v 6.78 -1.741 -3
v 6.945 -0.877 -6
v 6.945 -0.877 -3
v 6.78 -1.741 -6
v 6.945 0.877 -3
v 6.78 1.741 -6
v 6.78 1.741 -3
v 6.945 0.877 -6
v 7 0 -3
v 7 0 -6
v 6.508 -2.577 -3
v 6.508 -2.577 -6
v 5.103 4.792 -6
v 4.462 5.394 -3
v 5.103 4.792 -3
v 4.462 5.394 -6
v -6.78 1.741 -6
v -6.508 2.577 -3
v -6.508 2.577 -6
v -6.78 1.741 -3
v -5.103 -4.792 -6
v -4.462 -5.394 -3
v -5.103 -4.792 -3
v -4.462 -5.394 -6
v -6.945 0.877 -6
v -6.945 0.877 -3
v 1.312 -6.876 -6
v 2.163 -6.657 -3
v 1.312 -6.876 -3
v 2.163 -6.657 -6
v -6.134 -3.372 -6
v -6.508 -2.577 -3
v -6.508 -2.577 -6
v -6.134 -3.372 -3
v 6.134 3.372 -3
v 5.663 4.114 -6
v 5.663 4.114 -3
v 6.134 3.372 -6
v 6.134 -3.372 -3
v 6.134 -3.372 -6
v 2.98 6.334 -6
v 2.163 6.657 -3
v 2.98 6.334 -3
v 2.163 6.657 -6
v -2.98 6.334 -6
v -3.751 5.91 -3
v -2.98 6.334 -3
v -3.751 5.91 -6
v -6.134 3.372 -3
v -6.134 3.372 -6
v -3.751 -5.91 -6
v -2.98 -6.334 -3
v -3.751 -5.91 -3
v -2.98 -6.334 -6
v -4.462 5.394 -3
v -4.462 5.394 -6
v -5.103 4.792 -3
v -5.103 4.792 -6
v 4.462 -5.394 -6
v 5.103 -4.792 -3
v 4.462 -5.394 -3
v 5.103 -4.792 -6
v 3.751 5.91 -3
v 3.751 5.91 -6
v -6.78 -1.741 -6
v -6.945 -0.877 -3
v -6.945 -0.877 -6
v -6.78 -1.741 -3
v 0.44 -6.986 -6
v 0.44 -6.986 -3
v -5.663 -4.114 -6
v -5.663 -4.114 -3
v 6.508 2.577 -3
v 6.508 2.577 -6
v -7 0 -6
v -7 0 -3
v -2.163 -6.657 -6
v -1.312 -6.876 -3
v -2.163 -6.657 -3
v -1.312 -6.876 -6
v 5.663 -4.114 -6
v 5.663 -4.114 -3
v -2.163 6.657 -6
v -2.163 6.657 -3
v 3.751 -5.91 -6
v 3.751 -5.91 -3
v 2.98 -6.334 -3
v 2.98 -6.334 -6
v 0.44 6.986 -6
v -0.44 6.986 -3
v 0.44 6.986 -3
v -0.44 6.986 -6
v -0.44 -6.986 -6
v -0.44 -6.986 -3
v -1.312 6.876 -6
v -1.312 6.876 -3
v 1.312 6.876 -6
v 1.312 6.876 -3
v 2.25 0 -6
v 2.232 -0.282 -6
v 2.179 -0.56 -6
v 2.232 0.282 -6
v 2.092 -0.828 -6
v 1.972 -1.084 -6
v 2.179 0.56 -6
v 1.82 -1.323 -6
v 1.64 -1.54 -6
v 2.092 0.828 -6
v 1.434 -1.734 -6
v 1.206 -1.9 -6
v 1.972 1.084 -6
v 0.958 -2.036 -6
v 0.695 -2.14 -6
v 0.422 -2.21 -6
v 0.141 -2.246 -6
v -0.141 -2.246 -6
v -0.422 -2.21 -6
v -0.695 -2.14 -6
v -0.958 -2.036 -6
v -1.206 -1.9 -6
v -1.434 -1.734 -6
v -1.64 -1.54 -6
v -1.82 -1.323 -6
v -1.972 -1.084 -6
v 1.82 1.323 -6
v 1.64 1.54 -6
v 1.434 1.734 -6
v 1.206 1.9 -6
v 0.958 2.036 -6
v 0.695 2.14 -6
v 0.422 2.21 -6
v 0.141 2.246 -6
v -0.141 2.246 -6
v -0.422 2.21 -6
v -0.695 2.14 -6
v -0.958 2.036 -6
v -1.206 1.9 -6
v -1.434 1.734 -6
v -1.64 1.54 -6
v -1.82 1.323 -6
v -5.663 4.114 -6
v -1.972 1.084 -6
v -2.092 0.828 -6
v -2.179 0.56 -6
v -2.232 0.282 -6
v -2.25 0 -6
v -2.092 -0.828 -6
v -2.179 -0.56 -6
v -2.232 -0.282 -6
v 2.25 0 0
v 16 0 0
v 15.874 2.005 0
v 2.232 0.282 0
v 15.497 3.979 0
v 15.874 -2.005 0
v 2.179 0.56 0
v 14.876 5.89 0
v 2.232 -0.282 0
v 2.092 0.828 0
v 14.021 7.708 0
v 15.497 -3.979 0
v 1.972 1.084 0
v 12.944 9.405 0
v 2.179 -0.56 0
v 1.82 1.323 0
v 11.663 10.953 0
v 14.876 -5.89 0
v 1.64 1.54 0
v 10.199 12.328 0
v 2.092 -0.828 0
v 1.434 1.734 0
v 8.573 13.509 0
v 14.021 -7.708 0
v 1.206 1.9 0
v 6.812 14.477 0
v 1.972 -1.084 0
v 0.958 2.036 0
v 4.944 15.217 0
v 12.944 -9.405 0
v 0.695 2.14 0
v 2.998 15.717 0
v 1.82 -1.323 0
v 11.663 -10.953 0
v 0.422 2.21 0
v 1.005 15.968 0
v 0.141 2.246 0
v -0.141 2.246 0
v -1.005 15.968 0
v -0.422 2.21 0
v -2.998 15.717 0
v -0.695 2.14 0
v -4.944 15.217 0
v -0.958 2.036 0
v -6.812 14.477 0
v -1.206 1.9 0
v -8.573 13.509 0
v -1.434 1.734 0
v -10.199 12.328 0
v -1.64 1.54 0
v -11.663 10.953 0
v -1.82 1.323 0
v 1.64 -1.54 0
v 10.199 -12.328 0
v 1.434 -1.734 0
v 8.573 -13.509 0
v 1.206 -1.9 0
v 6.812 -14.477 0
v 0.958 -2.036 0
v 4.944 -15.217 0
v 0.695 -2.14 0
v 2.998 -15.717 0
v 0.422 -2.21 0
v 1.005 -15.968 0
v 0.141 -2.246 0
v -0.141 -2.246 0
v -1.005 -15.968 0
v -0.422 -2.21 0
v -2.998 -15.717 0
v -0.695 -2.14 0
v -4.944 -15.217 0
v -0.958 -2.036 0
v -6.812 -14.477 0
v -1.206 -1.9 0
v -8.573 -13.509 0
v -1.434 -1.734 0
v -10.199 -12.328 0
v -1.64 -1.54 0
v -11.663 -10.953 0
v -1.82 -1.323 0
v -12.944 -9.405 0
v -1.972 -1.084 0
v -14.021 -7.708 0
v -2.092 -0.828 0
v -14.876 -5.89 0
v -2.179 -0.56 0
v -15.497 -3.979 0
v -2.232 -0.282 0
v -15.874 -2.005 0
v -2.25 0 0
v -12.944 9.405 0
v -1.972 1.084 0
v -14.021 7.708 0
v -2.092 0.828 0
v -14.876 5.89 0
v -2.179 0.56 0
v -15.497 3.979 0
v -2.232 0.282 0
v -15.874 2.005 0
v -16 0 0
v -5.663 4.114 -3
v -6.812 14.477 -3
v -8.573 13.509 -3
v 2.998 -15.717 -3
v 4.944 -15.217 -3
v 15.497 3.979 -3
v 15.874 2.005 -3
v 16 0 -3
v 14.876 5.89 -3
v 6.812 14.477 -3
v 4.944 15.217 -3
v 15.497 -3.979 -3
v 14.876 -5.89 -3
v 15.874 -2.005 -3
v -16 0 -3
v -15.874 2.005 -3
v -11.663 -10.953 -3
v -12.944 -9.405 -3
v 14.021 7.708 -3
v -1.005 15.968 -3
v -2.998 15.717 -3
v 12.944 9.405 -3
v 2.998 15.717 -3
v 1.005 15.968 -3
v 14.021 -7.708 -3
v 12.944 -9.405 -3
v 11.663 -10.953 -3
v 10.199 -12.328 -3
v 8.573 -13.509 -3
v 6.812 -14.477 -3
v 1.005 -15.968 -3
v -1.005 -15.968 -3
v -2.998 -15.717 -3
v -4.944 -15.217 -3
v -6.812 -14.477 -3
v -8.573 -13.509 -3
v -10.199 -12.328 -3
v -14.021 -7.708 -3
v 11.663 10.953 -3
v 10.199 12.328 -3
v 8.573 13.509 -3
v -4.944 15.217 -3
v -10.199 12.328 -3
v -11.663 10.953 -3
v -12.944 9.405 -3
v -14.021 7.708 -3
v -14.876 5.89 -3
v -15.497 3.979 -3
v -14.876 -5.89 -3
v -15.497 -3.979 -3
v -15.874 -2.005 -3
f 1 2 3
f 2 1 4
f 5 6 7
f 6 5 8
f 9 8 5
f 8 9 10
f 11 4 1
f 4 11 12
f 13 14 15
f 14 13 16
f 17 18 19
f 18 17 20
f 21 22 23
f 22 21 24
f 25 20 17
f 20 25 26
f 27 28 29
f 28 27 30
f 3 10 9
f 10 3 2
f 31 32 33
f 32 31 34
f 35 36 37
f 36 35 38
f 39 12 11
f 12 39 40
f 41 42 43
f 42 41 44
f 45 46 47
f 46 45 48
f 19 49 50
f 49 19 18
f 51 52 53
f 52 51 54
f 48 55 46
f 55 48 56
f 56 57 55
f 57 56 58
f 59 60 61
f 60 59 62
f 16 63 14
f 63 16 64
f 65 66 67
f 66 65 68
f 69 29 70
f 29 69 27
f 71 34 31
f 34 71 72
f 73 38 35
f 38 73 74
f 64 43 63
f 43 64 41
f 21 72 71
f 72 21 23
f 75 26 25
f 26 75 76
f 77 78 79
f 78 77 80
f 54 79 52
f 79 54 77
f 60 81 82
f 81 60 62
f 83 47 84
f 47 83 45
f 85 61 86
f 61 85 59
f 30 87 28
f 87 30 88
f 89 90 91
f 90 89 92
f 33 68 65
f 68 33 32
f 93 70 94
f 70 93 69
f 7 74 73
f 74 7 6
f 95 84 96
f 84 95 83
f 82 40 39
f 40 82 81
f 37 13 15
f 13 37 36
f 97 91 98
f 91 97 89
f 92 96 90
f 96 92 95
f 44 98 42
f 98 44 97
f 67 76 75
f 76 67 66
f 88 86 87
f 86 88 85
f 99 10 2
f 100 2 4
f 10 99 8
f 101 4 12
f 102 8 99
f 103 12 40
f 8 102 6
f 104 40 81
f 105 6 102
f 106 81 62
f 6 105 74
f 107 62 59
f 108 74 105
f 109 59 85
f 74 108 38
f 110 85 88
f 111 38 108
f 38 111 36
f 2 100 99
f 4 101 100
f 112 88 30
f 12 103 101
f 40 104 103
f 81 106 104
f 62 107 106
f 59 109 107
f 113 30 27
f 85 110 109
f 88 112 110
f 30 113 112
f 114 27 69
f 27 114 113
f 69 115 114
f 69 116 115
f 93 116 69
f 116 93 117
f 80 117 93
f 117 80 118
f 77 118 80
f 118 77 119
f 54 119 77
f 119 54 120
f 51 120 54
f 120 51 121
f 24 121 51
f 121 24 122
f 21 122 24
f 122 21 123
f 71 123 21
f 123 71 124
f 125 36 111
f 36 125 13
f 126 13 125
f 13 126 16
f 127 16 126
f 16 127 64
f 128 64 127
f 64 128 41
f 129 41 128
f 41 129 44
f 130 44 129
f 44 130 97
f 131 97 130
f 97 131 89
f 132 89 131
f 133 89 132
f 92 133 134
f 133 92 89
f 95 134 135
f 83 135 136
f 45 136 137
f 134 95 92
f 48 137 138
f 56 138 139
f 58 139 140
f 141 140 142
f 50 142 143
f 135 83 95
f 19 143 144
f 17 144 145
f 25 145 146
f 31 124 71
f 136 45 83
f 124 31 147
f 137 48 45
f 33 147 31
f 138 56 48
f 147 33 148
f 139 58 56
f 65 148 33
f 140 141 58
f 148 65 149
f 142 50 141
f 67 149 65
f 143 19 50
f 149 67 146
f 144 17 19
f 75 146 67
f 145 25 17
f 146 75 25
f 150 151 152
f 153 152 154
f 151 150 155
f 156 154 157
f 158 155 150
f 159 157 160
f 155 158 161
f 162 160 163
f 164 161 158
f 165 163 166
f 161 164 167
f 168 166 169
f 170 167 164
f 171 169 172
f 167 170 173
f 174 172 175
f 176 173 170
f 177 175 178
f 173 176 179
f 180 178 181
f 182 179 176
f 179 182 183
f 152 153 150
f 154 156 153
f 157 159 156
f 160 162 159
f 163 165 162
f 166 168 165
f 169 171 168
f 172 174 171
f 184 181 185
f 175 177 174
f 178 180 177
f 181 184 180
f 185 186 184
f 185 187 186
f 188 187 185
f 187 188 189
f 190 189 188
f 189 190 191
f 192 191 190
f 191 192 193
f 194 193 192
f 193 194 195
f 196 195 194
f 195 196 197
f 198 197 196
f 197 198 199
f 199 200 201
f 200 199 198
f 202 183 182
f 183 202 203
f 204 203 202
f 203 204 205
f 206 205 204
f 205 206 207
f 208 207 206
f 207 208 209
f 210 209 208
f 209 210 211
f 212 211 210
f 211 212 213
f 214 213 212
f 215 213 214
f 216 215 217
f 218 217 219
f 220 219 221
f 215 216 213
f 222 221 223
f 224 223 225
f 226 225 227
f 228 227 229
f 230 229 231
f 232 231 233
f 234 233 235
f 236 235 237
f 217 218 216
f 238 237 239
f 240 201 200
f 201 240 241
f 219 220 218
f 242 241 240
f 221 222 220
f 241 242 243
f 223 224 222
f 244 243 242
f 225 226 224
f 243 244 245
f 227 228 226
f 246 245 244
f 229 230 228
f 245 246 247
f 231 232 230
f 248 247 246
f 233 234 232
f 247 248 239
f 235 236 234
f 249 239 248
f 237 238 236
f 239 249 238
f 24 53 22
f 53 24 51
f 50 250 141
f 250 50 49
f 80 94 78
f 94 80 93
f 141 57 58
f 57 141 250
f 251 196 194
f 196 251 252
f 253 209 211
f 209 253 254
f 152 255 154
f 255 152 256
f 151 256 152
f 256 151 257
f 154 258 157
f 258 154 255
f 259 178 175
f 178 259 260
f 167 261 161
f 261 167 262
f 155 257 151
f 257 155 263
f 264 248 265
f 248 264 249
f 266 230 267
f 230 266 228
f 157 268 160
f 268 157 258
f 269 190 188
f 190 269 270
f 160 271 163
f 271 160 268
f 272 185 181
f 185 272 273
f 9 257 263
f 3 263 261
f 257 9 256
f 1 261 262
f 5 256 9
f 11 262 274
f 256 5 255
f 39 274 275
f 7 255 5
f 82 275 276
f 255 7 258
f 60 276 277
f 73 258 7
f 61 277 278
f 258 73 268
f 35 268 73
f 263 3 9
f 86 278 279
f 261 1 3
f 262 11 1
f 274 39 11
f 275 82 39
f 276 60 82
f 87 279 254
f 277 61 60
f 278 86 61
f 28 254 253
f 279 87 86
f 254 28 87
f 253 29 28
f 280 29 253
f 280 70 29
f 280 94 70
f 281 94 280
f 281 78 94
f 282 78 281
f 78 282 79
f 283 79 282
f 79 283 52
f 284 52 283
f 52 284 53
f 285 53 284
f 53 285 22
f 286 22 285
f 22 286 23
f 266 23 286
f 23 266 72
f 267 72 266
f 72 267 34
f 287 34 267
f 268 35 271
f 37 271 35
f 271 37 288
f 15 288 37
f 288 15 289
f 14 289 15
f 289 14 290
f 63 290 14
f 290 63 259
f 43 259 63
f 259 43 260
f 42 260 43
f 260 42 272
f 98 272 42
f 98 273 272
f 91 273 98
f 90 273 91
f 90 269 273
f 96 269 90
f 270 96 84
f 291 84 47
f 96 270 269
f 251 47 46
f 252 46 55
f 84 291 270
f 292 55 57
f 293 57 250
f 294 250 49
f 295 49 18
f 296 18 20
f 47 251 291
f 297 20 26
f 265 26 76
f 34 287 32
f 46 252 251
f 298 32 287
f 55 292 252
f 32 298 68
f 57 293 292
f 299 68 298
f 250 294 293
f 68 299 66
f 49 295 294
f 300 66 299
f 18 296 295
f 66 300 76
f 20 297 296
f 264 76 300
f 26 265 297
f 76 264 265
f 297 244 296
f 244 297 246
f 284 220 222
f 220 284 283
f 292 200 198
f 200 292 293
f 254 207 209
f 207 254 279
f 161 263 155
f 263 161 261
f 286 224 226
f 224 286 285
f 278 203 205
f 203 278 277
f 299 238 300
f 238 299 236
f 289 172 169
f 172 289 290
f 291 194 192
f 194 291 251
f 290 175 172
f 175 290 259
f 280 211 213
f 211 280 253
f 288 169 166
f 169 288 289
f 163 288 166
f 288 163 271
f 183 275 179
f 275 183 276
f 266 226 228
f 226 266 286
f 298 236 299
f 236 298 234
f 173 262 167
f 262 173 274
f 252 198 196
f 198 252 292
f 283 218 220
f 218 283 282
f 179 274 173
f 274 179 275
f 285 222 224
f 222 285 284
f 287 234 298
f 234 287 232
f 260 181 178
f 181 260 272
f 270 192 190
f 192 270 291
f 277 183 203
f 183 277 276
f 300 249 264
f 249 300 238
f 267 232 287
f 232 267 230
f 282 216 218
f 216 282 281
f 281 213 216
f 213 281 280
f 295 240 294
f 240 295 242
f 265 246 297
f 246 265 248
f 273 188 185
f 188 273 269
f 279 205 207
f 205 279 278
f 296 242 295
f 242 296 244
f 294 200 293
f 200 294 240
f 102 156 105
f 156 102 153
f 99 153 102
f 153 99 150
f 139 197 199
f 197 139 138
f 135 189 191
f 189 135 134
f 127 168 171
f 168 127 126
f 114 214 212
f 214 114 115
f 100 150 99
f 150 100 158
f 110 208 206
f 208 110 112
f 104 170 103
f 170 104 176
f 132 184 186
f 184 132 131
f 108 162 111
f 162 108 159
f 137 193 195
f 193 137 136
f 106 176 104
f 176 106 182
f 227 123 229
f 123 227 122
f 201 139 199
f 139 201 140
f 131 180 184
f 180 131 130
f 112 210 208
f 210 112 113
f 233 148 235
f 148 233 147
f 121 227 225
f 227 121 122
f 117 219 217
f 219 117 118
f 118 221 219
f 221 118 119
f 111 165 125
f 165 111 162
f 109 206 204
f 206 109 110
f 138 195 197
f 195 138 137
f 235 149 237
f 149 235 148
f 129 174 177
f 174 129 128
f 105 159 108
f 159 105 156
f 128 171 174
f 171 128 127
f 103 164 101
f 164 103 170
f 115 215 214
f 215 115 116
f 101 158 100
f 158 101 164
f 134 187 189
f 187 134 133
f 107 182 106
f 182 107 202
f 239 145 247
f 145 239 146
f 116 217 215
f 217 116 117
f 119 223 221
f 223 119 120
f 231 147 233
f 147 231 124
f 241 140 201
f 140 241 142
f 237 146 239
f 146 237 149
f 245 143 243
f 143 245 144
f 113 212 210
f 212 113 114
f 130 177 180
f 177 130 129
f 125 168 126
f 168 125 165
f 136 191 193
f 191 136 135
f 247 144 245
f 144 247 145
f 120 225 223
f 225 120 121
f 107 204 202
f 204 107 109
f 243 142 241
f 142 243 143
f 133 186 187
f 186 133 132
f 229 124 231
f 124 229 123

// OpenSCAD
$fn = 50;


difference() {
	union() {
		translate(v = [0, 0, -6.0000000000]) {
			cylinder(h = 6, r = 7.0000000000);
		}
		translate(v = [0, 0, -3.0000000000]) {
			cylinder(h = 3, r = 16.0000000000);
		}
	}
	union() {
		#translate(v = [0, 0, -6]) {
			cylinder(h = 6, r = 2.2500000000);
		}
	}
}
